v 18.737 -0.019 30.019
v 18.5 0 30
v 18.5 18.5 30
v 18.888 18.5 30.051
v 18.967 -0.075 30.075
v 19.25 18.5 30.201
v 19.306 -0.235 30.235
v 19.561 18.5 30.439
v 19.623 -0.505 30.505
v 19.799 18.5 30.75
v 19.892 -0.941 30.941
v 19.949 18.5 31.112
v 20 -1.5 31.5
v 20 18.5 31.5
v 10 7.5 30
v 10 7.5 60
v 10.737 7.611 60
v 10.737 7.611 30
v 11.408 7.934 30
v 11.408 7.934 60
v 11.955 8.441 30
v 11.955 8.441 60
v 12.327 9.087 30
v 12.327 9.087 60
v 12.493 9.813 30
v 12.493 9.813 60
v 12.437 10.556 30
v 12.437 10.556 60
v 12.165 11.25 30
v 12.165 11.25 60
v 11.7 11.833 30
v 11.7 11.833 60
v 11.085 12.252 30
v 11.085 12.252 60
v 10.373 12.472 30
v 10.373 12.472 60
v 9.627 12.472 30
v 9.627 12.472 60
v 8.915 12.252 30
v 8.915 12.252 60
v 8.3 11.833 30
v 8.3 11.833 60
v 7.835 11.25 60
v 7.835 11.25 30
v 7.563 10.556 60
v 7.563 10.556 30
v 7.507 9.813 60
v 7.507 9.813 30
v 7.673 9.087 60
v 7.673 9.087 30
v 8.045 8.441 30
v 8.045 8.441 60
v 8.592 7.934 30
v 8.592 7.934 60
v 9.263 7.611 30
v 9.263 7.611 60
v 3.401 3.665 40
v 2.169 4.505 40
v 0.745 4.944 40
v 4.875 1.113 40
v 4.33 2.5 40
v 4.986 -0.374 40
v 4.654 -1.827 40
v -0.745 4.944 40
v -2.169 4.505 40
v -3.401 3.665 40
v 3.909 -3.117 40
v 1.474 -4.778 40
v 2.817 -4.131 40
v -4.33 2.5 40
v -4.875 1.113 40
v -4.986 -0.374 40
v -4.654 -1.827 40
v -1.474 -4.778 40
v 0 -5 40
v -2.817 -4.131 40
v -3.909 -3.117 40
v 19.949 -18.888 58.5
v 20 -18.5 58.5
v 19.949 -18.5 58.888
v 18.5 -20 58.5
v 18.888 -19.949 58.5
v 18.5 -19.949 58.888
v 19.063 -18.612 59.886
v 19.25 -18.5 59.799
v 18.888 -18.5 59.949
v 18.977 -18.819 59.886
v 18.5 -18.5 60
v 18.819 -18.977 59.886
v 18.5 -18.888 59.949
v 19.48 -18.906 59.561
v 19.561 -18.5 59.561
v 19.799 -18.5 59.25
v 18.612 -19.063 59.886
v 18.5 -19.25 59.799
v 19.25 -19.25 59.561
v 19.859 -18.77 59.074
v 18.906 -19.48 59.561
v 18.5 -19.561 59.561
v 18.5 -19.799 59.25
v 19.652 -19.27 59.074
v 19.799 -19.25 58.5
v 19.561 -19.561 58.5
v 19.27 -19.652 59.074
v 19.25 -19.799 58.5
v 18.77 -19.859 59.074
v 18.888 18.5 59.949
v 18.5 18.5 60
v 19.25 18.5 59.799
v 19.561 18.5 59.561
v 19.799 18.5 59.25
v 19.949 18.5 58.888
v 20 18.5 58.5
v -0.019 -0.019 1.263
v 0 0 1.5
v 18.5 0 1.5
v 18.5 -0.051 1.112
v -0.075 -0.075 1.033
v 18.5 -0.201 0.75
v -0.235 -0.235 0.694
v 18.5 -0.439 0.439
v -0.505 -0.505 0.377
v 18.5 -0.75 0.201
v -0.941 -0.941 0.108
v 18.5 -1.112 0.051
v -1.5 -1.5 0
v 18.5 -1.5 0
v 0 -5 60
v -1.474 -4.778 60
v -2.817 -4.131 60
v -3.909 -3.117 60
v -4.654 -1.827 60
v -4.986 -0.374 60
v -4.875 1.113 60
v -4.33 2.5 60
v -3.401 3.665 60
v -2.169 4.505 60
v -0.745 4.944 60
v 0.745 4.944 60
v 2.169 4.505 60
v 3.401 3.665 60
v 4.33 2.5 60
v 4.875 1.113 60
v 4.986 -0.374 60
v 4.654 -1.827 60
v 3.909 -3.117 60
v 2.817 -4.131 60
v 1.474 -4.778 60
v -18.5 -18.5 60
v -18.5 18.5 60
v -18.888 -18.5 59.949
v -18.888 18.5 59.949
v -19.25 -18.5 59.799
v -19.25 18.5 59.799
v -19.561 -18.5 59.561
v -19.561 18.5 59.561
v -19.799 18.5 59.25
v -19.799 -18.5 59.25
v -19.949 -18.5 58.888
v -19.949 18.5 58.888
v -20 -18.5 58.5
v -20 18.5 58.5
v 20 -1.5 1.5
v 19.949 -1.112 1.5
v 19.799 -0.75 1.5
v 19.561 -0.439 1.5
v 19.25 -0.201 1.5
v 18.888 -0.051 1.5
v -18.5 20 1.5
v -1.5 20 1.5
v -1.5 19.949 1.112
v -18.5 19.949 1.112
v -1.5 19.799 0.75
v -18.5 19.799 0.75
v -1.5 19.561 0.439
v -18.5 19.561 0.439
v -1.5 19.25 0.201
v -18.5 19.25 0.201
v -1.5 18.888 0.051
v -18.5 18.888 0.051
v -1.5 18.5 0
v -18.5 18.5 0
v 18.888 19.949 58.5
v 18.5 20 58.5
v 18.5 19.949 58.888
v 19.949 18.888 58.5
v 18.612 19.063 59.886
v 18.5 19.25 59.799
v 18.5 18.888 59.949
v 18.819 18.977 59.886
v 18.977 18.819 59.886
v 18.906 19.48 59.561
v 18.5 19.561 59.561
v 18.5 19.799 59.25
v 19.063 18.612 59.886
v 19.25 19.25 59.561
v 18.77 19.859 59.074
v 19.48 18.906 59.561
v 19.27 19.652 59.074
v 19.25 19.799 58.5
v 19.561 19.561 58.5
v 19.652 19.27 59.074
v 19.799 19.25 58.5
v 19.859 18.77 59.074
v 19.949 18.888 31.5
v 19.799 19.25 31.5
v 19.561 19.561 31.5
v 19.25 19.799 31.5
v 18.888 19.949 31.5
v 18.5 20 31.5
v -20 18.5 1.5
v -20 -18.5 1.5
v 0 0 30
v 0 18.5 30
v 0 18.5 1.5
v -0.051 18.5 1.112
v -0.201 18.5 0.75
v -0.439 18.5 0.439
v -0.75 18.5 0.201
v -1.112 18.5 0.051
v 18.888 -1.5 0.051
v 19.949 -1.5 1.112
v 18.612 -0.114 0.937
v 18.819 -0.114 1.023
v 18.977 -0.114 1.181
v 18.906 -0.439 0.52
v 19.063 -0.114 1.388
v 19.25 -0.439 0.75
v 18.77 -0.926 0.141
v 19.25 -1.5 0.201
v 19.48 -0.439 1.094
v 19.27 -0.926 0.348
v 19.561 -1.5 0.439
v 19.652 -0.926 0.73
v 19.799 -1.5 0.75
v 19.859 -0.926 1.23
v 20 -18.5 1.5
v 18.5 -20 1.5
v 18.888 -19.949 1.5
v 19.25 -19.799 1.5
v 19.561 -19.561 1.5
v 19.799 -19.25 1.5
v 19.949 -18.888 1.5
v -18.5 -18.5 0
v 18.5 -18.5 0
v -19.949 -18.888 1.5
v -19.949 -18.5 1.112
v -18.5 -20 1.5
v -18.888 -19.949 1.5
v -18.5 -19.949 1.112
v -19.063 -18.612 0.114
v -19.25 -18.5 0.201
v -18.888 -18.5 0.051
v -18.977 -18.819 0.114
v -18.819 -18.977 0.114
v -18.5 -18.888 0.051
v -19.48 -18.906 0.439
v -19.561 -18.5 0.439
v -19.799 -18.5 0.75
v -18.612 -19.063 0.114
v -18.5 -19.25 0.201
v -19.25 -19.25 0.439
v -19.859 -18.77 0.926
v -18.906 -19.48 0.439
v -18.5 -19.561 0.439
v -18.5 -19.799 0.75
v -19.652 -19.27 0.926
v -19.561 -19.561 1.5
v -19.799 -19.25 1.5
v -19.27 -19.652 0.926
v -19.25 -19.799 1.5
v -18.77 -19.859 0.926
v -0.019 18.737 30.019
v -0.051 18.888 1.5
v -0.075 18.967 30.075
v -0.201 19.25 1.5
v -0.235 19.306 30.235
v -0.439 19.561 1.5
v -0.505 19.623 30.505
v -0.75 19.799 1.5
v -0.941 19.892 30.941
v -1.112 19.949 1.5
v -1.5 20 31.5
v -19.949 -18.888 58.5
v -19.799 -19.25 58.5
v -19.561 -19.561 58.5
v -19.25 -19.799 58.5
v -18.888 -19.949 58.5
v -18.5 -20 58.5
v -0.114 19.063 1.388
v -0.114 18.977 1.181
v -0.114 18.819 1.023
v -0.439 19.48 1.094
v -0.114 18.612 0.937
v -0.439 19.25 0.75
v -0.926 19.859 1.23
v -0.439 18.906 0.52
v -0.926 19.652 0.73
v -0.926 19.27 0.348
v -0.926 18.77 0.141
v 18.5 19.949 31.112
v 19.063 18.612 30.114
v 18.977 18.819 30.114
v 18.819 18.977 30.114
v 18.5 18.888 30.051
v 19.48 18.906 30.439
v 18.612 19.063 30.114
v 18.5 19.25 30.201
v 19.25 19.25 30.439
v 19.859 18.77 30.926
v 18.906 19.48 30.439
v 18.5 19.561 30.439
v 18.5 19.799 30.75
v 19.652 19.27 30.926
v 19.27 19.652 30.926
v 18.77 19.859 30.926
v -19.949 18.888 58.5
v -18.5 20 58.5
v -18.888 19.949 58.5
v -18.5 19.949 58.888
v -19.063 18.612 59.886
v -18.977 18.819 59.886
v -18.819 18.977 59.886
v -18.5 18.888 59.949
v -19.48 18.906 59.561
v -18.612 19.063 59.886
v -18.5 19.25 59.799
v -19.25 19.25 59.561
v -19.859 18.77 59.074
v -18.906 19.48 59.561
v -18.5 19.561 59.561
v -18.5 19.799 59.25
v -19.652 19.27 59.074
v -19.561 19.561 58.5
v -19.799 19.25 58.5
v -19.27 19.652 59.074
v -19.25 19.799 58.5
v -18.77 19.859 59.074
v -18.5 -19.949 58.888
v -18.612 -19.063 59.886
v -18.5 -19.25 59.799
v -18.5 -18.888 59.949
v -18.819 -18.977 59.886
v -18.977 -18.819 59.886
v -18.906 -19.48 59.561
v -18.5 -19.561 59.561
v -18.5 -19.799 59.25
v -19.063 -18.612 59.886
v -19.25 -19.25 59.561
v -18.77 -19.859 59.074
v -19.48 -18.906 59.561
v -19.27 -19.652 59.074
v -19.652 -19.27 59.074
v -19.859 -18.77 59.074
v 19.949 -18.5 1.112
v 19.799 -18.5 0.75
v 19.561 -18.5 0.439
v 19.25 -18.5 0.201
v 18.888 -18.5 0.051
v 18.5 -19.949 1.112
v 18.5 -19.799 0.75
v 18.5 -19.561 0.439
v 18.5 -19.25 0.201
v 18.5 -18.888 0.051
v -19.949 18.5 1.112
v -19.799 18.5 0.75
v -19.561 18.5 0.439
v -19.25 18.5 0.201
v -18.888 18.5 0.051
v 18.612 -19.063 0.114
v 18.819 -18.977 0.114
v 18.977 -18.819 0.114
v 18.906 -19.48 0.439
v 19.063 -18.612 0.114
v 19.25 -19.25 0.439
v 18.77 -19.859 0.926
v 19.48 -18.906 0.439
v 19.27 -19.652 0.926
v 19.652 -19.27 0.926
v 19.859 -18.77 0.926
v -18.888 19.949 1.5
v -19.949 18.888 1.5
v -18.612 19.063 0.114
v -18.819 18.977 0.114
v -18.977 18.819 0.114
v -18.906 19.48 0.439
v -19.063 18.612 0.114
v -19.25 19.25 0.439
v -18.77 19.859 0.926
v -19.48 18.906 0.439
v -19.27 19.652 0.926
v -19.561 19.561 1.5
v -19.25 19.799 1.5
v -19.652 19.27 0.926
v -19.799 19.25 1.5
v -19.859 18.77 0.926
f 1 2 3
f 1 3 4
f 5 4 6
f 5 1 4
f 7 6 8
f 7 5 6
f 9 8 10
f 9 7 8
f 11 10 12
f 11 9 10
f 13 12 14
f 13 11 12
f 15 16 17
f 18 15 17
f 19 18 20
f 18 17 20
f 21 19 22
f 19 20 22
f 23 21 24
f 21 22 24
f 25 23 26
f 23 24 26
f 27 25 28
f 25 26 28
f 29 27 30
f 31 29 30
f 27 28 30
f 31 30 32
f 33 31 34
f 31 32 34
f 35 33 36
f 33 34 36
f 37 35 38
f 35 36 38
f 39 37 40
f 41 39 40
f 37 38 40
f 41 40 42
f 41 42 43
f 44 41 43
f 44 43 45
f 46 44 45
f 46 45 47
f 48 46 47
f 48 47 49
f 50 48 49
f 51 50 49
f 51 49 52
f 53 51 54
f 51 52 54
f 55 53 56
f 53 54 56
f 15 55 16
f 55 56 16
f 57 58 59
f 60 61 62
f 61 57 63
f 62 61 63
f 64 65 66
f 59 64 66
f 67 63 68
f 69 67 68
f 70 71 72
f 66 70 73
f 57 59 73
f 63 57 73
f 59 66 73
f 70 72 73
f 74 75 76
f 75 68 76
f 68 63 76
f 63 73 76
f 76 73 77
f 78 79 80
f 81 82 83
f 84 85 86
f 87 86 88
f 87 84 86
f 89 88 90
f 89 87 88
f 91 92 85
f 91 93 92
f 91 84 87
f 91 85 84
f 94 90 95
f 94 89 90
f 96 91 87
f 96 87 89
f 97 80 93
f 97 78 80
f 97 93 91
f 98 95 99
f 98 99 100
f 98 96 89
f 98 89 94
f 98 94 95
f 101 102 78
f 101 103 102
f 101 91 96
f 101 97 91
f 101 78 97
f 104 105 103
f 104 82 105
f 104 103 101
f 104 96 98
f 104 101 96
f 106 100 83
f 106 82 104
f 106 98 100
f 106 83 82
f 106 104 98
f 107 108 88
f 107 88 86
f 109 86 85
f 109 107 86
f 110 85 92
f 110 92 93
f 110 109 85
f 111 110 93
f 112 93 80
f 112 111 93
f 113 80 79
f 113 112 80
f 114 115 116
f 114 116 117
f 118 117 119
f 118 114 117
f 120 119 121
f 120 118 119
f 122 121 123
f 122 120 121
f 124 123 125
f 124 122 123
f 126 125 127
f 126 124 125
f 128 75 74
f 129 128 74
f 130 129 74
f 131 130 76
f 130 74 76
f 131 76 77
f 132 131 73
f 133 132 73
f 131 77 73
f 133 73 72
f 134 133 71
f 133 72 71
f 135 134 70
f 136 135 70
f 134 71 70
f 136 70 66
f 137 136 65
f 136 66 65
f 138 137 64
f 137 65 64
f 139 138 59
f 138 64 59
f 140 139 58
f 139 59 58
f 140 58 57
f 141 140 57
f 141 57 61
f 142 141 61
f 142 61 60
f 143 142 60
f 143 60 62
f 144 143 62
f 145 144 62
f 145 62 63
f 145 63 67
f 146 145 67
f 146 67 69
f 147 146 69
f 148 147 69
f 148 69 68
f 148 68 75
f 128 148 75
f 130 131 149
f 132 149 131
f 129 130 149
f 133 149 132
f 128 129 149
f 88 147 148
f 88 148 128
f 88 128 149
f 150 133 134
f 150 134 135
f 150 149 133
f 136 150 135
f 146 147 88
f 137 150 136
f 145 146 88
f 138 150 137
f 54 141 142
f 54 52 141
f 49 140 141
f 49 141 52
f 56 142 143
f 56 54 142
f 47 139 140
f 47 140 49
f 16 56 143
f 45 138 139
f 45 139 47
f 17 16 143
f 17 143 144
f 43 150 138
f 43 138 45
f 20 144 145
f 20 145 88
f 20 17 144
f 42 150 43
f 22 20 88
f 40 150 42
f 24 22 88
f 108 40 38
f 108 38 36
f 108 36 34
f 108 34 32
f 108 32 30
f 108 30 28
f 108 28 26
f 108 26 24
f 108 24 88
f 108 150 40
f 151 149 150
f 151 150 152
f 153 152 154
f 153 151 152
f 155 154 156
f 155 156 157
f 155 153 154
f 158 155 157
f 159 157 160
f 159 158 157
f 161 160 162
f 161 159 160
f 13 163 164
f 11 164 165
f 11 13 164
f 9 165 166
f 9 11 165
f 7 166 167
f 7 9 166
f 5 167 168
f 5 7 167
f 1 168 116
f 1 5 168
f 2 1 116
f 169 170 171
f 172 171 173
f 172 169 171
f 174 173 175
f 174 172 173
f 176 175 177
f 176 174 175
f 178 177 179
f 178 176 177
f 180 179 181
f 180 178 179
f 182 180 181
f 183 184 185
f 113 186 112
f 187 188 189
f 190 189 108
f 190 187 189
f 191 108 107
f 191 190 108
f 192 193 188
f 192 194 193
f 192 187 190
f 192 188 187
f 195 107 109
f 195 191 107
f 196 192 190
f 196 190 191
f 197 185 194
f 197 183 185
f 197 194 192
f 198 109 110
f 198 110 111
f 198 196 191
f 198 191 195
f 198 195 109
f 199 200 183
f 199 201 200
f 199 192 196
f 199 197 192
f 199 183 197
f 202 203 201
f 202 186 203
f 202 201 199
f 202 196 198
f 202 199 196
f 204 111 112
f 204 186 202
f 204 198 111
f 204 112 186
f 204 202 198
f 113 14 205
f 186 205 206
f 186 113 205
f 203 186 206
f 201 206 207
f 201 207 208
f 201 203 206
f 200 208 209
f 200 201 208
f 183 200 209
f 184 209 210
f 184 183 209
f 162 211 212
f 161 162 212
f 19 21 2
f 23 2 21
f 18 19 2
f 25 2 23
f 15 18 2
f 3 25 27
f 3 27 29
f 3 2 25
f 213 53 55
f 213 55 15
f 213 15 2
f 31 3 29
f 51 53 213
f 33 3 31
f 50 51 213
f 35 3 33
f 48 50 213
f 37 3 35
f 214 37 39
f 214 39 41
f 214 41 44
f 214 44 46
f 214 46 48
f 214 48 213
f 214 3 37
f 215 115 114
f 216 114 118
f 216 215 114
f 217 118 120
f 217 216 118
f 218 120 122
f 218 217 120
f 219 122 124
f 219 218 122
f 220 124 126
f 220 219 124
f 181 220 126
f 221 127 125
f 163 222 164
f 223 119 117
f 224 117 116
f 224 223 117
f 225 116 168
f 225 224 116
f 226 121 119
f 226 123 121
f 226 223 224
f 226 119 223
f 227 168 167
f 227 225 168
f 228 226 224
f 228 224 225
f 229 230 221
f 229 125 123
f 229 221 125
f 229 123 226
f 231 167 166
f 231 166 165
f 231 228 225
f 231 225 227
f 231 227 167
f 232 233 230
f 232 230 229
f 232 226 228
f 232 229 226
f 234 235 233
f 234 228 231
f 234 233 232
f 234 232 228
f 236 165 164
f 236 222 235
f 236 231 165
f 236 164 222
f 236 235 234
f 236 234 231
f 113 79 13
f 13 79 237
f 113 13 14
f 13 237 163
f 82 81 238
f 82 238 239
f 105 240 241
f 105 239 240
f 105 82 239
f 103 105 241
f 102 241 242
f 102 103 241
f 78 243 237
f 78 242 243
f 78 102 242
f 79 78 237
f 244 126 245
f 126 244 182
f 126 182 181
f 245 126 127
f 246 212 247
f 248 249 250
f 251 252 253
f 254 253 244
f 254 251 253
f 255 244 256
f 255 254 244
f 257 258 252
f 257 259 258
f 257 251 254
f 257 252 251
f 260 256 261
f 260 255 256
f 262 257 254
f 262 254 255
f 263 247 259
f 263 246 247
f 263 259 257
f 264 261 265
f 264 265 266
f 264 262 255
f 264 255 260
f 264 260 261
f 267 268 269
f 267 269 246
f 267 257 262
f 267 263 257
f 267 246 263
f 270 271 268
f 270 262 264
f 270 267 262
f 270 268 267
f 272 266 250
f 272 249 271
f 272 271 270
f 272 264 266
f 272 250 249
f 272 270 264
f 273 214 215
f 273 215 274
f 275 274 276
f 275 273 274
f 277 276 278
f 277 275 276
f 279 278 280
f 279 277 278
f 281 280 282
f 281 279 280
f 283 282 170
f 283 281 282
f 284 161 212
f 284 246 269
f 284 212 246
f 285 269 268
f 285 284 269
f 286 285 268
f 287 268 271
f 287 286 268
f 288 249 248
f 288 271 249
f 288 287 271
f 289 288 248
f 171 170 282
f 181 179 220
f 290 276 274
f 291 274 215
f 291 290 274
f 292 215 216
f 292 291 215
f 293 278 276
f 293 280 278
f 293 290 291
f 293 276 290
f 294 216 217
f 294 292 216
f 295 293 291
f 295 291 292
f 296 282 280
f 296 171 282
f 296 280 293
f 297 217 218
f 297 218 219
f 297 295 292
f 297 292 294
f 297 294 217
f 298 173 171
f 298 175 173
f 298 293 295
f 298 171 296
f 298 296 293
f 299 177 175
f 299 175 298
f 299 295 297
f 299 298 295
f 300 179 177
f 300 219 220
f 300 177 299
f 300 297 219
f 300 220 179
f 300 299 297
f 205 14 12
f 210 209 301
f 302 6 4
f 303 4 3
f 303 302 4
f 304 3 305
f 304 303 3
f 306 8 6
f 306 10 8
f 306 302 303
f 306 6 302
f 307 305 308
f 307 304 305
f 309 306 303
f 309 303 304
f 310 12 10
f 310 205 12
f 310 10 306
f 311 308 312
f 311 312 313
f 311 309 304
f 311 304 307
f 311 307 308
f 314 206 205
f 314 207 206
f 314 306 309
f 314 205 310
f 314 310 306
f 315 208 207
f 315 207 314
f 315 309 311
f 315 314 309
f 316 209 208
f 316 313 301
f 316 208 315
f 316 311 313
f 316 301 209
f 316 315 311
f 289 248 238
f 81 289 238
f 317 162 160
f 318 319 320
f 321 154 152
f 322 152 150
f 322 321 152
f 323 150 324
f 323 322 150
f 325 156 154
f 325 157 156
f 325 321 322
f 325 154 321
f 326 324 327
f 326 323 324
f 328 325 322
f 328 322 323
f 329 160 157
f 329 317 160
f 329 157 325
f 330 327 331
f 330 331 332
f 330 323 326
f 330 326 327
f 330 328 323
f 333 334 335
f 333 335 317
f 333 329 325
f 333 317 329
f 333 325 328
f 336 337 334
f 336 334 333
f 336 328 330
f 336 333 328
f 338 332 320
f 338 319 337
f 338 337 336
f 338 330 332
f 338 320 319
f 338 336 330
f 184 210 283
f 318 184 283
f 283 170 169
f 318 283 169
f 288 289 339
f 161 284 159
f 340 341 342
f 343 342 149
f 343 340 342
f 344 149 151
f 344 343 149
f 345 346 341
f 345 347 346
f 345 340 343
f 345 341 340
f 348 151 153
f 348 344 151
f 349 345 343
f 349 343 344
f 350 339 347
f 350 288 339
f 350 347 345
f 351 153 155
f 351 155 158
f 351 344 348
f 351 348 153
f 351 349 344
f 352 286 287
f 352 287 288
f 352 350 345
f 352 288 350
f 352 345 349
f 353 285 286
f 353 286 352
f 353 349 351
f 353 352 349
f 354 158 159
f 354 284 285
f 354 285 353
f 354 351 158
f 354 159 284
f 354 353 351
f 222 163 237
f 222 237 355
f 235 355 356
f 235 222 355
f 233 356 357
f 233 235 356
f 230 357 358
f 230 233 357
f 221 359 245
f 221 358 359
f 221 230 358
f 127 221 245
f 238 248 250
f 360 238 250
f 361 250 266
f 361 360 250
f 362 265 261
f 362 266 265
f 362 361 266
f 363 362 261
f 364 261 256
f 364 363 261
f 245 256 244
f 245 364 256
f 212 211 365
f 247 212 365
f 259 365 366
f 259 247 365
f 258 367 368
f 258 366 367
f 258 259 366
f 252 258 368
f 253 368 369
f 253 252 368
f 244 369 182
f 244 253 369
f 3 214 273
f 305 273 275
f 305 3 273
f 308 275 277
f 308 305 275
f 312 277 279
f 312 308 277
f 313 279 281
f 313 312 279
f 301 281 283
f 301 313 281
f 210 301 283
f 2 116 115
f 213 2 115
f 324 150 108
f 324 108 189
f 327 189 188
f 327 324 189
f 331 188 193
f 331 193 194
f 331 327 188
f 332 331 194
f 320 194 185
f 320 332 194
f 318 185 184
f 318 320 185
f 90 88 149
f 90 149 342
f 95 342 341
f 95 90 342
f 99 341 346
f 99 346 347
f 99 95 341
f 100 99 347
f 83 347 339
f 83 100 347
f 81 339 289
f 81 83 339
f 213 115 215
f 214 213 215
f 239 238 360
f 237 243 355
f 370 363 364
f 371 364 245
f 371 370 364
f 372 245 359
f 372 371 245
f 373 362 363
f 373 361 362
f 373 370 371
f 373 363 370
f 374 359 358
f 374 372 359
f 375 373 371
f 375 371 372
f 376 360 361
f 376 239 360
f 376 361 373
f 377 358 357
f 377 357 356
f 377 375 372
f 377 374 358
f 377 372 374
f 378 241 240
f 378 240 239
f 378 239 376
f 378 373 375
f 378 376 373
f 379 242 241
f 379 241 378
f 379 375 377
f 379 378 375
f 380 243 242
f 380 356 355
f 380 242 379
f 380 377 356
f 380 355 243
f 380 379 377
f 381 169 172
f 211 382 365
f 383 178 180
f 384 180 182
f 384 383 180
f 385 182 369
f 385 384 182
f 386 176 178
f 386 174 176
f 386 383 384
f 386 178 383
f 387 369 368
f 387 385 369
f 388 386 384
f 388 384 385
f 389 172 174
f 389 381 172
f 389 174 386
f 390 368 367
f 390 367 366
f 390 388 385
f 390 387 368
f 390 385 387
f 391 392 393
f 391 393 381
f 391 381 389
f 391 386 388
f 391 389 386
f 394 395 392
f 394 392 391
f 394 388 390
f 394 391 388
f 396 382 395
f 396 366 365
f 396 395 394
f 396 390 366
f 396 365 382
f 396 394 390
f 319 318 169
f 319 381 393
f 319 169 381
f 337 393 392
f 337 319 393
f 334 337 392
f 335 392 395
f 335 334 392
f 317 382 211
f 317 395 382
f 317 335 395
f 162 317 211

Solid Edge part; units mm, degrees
sketch "Sketch1" plane through (0, 0, 0) normal (0, 0, 1) x (1, 0, 0)
  line L0 (-20, -20) -> (20, -20)
  line L1 (20, -20) -> (20, 20)
  line L2 (20, 20) -> (-20, 20)
  line L3 (-20, 20) -> (-20, -20)
extrude "Protrusion1" add sketch "Sketch1" along normal blind 60
sketch "Sketch2" plane through (0, 0, 0) normal (0, 0, -1) x (0, 1, 0)
  line L0 (20, 20) -> (0, 20)
  line L1 (0, 20) -> (0, 0)
  line L2 (0, 0) -> (20, 0)
  line L3 (20, 0) -> (20, 20)
extrude "ExtrudedCutout_1" cut sketch "Sketch2" against normal blind 30
hole "Hole_3" at (10, 10, 60) direction (0, 0, -1) diameter 5 end up to next
hole "Hole_4" at (0, 0, 60) direction (0, 0, -1) diameter 10 depth 20
fillet "Round_1" radius 1.5 18 edges at (20, 20, 45) (-20, 20, 30) (20, -20, 30) (-20, -20, 30) (20, -10, 0) (0, -20, 0) (-20, 0, 0) (-10, 20, 0) (0, 20, 15) (0, 10, 0) (10, 0, 0) (20, 0, 15) (20, 10, 30) (10, 20, 30) (0, 20, 60) (-20, 0, 60) (20, 0, 60) (0, -20, 60)
properties material "Wood, Oak"
